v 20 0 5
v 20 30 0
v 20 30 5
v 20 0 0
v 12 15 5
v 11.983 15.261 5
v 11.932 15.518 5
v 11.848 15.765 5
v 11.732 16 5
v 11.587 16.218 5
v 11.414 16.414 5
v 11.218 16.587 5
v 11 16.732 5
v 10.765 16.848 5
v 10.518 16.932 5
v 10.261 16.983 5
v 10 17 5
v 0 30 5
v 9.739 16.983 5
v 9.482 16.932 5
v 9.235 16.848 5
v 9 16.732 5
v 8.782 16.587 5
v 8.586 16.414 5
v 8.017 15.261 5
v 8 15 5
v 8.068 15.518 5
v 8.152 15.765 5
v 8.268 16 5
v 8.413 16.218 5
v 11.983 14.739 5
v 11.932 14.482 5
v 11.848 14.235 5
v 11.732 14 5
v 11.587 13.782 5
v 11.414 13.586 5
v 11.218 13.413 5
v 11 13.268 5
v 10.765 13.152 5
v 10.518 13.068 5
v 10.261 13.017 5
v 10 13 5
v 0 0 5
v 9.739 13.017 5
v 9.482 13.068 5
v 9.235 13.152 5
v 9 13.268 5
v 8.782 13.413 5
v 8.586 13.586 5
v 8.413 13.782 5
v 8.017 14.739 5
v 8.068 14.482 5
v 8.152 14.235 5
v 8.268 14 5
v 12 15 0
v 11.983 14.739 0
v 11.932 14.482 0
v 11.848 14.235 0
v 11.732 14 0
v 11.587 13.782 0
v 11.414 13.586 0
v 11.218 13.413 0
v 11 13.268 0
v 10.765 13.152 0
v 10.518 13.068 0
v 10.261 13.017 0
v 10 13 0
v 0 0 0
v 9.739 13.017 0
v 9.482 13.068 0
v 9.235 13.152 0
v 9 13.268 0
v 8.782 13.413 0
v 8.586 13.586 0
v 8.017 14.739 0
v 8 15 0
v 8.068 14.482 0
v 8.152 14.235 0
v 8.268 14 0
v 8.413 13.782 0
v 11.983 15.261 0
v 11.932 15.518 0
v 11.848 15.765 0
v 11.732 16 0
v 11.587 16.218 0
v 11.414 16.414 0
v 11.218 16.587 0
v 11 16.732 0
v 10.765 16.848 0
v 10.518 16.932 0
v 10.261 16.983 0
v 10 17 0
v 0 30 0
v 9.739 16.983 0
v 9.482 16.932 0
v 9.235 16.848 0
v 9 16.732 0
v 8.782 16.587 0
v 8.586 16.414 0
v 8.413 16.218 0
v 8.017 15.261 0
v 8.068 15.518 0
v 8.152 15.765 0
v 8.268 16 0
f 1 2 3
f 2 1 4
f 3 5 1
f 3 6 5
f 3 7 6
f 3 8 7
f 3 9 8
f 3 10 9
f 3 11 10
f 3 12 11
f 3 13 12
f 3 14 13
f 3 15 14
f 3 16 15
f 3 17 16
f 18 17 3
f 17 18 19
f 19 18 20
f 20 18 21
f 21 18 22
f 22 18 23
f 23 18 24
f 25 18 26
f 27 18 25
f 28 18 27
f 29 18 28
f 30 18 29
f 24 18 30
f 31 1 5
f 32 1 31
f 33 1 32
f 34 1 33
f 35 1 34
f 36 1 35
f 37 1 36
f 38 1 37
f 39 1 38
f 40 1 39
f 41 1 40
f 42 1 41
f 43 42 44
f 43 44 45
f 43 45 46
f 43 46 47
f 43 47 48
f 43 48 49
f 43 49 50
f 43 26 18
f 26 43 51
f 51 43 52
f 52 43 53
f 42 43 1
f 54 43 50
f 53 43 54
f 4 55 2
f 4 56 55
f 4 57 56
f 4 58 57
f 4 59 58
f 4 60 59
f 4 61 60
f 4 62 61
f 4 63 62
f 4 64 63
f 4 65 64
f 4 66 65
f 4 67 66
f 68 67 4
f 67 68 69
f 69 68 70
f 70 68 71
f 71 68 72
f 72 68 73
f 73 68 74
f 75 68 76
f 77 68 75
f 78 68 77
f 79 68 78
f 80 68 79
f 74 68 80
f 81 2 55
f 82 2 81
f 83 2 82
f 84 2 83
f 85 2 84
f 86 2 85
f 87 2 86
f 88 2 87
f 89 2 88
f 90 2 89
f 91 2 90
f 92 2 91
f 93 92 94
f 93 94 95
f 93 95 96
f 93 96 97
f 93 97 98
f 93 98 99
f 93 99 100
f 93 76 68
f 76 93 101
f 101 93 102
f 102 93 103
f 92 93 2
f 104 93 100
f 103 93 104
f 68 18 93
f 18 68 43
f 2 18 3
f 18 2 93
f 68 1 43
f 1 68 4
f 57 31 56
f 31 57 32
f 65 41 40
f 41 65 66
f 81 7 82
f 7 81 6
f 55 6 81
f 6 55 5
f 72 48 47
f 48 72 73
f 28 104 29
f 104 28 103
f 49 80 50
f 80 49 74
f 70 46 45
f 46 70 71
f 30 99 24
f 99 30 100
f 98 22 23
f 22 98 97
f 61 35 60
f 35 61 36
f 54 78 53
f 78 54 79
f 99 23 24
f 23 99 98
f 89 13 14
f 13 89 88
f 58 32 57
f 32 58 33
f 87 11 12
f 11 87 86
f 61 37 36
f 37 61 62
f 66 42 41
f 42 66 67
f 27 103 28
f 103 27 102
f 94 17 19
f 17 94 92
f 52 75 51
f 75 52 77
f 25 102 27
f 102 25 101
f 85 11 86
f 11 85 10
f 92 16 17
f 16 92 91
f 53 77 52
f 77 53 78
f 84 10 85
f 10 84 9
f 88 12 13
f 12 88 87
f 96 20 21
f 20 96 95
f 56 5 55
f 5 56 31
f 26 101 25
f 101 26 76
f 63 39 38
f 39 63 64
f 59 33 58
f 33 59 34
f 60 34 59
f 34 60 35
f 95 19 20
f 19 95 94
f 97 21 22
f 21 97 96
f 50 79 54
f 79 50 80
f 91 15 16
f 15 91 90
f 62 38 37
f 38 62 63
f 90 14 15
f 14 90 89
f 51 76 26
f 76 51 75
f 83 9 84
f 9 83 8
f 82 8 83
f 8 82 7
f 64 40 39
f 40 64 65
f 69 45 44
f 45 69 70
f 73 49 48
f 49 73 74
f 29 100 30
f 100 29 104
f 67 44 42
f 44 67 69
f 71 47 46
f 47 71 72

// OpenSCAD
difference(){cube([20,30,5]);translate([10,15,-1])cylinder(h=7,r=2,$fn=48);}
